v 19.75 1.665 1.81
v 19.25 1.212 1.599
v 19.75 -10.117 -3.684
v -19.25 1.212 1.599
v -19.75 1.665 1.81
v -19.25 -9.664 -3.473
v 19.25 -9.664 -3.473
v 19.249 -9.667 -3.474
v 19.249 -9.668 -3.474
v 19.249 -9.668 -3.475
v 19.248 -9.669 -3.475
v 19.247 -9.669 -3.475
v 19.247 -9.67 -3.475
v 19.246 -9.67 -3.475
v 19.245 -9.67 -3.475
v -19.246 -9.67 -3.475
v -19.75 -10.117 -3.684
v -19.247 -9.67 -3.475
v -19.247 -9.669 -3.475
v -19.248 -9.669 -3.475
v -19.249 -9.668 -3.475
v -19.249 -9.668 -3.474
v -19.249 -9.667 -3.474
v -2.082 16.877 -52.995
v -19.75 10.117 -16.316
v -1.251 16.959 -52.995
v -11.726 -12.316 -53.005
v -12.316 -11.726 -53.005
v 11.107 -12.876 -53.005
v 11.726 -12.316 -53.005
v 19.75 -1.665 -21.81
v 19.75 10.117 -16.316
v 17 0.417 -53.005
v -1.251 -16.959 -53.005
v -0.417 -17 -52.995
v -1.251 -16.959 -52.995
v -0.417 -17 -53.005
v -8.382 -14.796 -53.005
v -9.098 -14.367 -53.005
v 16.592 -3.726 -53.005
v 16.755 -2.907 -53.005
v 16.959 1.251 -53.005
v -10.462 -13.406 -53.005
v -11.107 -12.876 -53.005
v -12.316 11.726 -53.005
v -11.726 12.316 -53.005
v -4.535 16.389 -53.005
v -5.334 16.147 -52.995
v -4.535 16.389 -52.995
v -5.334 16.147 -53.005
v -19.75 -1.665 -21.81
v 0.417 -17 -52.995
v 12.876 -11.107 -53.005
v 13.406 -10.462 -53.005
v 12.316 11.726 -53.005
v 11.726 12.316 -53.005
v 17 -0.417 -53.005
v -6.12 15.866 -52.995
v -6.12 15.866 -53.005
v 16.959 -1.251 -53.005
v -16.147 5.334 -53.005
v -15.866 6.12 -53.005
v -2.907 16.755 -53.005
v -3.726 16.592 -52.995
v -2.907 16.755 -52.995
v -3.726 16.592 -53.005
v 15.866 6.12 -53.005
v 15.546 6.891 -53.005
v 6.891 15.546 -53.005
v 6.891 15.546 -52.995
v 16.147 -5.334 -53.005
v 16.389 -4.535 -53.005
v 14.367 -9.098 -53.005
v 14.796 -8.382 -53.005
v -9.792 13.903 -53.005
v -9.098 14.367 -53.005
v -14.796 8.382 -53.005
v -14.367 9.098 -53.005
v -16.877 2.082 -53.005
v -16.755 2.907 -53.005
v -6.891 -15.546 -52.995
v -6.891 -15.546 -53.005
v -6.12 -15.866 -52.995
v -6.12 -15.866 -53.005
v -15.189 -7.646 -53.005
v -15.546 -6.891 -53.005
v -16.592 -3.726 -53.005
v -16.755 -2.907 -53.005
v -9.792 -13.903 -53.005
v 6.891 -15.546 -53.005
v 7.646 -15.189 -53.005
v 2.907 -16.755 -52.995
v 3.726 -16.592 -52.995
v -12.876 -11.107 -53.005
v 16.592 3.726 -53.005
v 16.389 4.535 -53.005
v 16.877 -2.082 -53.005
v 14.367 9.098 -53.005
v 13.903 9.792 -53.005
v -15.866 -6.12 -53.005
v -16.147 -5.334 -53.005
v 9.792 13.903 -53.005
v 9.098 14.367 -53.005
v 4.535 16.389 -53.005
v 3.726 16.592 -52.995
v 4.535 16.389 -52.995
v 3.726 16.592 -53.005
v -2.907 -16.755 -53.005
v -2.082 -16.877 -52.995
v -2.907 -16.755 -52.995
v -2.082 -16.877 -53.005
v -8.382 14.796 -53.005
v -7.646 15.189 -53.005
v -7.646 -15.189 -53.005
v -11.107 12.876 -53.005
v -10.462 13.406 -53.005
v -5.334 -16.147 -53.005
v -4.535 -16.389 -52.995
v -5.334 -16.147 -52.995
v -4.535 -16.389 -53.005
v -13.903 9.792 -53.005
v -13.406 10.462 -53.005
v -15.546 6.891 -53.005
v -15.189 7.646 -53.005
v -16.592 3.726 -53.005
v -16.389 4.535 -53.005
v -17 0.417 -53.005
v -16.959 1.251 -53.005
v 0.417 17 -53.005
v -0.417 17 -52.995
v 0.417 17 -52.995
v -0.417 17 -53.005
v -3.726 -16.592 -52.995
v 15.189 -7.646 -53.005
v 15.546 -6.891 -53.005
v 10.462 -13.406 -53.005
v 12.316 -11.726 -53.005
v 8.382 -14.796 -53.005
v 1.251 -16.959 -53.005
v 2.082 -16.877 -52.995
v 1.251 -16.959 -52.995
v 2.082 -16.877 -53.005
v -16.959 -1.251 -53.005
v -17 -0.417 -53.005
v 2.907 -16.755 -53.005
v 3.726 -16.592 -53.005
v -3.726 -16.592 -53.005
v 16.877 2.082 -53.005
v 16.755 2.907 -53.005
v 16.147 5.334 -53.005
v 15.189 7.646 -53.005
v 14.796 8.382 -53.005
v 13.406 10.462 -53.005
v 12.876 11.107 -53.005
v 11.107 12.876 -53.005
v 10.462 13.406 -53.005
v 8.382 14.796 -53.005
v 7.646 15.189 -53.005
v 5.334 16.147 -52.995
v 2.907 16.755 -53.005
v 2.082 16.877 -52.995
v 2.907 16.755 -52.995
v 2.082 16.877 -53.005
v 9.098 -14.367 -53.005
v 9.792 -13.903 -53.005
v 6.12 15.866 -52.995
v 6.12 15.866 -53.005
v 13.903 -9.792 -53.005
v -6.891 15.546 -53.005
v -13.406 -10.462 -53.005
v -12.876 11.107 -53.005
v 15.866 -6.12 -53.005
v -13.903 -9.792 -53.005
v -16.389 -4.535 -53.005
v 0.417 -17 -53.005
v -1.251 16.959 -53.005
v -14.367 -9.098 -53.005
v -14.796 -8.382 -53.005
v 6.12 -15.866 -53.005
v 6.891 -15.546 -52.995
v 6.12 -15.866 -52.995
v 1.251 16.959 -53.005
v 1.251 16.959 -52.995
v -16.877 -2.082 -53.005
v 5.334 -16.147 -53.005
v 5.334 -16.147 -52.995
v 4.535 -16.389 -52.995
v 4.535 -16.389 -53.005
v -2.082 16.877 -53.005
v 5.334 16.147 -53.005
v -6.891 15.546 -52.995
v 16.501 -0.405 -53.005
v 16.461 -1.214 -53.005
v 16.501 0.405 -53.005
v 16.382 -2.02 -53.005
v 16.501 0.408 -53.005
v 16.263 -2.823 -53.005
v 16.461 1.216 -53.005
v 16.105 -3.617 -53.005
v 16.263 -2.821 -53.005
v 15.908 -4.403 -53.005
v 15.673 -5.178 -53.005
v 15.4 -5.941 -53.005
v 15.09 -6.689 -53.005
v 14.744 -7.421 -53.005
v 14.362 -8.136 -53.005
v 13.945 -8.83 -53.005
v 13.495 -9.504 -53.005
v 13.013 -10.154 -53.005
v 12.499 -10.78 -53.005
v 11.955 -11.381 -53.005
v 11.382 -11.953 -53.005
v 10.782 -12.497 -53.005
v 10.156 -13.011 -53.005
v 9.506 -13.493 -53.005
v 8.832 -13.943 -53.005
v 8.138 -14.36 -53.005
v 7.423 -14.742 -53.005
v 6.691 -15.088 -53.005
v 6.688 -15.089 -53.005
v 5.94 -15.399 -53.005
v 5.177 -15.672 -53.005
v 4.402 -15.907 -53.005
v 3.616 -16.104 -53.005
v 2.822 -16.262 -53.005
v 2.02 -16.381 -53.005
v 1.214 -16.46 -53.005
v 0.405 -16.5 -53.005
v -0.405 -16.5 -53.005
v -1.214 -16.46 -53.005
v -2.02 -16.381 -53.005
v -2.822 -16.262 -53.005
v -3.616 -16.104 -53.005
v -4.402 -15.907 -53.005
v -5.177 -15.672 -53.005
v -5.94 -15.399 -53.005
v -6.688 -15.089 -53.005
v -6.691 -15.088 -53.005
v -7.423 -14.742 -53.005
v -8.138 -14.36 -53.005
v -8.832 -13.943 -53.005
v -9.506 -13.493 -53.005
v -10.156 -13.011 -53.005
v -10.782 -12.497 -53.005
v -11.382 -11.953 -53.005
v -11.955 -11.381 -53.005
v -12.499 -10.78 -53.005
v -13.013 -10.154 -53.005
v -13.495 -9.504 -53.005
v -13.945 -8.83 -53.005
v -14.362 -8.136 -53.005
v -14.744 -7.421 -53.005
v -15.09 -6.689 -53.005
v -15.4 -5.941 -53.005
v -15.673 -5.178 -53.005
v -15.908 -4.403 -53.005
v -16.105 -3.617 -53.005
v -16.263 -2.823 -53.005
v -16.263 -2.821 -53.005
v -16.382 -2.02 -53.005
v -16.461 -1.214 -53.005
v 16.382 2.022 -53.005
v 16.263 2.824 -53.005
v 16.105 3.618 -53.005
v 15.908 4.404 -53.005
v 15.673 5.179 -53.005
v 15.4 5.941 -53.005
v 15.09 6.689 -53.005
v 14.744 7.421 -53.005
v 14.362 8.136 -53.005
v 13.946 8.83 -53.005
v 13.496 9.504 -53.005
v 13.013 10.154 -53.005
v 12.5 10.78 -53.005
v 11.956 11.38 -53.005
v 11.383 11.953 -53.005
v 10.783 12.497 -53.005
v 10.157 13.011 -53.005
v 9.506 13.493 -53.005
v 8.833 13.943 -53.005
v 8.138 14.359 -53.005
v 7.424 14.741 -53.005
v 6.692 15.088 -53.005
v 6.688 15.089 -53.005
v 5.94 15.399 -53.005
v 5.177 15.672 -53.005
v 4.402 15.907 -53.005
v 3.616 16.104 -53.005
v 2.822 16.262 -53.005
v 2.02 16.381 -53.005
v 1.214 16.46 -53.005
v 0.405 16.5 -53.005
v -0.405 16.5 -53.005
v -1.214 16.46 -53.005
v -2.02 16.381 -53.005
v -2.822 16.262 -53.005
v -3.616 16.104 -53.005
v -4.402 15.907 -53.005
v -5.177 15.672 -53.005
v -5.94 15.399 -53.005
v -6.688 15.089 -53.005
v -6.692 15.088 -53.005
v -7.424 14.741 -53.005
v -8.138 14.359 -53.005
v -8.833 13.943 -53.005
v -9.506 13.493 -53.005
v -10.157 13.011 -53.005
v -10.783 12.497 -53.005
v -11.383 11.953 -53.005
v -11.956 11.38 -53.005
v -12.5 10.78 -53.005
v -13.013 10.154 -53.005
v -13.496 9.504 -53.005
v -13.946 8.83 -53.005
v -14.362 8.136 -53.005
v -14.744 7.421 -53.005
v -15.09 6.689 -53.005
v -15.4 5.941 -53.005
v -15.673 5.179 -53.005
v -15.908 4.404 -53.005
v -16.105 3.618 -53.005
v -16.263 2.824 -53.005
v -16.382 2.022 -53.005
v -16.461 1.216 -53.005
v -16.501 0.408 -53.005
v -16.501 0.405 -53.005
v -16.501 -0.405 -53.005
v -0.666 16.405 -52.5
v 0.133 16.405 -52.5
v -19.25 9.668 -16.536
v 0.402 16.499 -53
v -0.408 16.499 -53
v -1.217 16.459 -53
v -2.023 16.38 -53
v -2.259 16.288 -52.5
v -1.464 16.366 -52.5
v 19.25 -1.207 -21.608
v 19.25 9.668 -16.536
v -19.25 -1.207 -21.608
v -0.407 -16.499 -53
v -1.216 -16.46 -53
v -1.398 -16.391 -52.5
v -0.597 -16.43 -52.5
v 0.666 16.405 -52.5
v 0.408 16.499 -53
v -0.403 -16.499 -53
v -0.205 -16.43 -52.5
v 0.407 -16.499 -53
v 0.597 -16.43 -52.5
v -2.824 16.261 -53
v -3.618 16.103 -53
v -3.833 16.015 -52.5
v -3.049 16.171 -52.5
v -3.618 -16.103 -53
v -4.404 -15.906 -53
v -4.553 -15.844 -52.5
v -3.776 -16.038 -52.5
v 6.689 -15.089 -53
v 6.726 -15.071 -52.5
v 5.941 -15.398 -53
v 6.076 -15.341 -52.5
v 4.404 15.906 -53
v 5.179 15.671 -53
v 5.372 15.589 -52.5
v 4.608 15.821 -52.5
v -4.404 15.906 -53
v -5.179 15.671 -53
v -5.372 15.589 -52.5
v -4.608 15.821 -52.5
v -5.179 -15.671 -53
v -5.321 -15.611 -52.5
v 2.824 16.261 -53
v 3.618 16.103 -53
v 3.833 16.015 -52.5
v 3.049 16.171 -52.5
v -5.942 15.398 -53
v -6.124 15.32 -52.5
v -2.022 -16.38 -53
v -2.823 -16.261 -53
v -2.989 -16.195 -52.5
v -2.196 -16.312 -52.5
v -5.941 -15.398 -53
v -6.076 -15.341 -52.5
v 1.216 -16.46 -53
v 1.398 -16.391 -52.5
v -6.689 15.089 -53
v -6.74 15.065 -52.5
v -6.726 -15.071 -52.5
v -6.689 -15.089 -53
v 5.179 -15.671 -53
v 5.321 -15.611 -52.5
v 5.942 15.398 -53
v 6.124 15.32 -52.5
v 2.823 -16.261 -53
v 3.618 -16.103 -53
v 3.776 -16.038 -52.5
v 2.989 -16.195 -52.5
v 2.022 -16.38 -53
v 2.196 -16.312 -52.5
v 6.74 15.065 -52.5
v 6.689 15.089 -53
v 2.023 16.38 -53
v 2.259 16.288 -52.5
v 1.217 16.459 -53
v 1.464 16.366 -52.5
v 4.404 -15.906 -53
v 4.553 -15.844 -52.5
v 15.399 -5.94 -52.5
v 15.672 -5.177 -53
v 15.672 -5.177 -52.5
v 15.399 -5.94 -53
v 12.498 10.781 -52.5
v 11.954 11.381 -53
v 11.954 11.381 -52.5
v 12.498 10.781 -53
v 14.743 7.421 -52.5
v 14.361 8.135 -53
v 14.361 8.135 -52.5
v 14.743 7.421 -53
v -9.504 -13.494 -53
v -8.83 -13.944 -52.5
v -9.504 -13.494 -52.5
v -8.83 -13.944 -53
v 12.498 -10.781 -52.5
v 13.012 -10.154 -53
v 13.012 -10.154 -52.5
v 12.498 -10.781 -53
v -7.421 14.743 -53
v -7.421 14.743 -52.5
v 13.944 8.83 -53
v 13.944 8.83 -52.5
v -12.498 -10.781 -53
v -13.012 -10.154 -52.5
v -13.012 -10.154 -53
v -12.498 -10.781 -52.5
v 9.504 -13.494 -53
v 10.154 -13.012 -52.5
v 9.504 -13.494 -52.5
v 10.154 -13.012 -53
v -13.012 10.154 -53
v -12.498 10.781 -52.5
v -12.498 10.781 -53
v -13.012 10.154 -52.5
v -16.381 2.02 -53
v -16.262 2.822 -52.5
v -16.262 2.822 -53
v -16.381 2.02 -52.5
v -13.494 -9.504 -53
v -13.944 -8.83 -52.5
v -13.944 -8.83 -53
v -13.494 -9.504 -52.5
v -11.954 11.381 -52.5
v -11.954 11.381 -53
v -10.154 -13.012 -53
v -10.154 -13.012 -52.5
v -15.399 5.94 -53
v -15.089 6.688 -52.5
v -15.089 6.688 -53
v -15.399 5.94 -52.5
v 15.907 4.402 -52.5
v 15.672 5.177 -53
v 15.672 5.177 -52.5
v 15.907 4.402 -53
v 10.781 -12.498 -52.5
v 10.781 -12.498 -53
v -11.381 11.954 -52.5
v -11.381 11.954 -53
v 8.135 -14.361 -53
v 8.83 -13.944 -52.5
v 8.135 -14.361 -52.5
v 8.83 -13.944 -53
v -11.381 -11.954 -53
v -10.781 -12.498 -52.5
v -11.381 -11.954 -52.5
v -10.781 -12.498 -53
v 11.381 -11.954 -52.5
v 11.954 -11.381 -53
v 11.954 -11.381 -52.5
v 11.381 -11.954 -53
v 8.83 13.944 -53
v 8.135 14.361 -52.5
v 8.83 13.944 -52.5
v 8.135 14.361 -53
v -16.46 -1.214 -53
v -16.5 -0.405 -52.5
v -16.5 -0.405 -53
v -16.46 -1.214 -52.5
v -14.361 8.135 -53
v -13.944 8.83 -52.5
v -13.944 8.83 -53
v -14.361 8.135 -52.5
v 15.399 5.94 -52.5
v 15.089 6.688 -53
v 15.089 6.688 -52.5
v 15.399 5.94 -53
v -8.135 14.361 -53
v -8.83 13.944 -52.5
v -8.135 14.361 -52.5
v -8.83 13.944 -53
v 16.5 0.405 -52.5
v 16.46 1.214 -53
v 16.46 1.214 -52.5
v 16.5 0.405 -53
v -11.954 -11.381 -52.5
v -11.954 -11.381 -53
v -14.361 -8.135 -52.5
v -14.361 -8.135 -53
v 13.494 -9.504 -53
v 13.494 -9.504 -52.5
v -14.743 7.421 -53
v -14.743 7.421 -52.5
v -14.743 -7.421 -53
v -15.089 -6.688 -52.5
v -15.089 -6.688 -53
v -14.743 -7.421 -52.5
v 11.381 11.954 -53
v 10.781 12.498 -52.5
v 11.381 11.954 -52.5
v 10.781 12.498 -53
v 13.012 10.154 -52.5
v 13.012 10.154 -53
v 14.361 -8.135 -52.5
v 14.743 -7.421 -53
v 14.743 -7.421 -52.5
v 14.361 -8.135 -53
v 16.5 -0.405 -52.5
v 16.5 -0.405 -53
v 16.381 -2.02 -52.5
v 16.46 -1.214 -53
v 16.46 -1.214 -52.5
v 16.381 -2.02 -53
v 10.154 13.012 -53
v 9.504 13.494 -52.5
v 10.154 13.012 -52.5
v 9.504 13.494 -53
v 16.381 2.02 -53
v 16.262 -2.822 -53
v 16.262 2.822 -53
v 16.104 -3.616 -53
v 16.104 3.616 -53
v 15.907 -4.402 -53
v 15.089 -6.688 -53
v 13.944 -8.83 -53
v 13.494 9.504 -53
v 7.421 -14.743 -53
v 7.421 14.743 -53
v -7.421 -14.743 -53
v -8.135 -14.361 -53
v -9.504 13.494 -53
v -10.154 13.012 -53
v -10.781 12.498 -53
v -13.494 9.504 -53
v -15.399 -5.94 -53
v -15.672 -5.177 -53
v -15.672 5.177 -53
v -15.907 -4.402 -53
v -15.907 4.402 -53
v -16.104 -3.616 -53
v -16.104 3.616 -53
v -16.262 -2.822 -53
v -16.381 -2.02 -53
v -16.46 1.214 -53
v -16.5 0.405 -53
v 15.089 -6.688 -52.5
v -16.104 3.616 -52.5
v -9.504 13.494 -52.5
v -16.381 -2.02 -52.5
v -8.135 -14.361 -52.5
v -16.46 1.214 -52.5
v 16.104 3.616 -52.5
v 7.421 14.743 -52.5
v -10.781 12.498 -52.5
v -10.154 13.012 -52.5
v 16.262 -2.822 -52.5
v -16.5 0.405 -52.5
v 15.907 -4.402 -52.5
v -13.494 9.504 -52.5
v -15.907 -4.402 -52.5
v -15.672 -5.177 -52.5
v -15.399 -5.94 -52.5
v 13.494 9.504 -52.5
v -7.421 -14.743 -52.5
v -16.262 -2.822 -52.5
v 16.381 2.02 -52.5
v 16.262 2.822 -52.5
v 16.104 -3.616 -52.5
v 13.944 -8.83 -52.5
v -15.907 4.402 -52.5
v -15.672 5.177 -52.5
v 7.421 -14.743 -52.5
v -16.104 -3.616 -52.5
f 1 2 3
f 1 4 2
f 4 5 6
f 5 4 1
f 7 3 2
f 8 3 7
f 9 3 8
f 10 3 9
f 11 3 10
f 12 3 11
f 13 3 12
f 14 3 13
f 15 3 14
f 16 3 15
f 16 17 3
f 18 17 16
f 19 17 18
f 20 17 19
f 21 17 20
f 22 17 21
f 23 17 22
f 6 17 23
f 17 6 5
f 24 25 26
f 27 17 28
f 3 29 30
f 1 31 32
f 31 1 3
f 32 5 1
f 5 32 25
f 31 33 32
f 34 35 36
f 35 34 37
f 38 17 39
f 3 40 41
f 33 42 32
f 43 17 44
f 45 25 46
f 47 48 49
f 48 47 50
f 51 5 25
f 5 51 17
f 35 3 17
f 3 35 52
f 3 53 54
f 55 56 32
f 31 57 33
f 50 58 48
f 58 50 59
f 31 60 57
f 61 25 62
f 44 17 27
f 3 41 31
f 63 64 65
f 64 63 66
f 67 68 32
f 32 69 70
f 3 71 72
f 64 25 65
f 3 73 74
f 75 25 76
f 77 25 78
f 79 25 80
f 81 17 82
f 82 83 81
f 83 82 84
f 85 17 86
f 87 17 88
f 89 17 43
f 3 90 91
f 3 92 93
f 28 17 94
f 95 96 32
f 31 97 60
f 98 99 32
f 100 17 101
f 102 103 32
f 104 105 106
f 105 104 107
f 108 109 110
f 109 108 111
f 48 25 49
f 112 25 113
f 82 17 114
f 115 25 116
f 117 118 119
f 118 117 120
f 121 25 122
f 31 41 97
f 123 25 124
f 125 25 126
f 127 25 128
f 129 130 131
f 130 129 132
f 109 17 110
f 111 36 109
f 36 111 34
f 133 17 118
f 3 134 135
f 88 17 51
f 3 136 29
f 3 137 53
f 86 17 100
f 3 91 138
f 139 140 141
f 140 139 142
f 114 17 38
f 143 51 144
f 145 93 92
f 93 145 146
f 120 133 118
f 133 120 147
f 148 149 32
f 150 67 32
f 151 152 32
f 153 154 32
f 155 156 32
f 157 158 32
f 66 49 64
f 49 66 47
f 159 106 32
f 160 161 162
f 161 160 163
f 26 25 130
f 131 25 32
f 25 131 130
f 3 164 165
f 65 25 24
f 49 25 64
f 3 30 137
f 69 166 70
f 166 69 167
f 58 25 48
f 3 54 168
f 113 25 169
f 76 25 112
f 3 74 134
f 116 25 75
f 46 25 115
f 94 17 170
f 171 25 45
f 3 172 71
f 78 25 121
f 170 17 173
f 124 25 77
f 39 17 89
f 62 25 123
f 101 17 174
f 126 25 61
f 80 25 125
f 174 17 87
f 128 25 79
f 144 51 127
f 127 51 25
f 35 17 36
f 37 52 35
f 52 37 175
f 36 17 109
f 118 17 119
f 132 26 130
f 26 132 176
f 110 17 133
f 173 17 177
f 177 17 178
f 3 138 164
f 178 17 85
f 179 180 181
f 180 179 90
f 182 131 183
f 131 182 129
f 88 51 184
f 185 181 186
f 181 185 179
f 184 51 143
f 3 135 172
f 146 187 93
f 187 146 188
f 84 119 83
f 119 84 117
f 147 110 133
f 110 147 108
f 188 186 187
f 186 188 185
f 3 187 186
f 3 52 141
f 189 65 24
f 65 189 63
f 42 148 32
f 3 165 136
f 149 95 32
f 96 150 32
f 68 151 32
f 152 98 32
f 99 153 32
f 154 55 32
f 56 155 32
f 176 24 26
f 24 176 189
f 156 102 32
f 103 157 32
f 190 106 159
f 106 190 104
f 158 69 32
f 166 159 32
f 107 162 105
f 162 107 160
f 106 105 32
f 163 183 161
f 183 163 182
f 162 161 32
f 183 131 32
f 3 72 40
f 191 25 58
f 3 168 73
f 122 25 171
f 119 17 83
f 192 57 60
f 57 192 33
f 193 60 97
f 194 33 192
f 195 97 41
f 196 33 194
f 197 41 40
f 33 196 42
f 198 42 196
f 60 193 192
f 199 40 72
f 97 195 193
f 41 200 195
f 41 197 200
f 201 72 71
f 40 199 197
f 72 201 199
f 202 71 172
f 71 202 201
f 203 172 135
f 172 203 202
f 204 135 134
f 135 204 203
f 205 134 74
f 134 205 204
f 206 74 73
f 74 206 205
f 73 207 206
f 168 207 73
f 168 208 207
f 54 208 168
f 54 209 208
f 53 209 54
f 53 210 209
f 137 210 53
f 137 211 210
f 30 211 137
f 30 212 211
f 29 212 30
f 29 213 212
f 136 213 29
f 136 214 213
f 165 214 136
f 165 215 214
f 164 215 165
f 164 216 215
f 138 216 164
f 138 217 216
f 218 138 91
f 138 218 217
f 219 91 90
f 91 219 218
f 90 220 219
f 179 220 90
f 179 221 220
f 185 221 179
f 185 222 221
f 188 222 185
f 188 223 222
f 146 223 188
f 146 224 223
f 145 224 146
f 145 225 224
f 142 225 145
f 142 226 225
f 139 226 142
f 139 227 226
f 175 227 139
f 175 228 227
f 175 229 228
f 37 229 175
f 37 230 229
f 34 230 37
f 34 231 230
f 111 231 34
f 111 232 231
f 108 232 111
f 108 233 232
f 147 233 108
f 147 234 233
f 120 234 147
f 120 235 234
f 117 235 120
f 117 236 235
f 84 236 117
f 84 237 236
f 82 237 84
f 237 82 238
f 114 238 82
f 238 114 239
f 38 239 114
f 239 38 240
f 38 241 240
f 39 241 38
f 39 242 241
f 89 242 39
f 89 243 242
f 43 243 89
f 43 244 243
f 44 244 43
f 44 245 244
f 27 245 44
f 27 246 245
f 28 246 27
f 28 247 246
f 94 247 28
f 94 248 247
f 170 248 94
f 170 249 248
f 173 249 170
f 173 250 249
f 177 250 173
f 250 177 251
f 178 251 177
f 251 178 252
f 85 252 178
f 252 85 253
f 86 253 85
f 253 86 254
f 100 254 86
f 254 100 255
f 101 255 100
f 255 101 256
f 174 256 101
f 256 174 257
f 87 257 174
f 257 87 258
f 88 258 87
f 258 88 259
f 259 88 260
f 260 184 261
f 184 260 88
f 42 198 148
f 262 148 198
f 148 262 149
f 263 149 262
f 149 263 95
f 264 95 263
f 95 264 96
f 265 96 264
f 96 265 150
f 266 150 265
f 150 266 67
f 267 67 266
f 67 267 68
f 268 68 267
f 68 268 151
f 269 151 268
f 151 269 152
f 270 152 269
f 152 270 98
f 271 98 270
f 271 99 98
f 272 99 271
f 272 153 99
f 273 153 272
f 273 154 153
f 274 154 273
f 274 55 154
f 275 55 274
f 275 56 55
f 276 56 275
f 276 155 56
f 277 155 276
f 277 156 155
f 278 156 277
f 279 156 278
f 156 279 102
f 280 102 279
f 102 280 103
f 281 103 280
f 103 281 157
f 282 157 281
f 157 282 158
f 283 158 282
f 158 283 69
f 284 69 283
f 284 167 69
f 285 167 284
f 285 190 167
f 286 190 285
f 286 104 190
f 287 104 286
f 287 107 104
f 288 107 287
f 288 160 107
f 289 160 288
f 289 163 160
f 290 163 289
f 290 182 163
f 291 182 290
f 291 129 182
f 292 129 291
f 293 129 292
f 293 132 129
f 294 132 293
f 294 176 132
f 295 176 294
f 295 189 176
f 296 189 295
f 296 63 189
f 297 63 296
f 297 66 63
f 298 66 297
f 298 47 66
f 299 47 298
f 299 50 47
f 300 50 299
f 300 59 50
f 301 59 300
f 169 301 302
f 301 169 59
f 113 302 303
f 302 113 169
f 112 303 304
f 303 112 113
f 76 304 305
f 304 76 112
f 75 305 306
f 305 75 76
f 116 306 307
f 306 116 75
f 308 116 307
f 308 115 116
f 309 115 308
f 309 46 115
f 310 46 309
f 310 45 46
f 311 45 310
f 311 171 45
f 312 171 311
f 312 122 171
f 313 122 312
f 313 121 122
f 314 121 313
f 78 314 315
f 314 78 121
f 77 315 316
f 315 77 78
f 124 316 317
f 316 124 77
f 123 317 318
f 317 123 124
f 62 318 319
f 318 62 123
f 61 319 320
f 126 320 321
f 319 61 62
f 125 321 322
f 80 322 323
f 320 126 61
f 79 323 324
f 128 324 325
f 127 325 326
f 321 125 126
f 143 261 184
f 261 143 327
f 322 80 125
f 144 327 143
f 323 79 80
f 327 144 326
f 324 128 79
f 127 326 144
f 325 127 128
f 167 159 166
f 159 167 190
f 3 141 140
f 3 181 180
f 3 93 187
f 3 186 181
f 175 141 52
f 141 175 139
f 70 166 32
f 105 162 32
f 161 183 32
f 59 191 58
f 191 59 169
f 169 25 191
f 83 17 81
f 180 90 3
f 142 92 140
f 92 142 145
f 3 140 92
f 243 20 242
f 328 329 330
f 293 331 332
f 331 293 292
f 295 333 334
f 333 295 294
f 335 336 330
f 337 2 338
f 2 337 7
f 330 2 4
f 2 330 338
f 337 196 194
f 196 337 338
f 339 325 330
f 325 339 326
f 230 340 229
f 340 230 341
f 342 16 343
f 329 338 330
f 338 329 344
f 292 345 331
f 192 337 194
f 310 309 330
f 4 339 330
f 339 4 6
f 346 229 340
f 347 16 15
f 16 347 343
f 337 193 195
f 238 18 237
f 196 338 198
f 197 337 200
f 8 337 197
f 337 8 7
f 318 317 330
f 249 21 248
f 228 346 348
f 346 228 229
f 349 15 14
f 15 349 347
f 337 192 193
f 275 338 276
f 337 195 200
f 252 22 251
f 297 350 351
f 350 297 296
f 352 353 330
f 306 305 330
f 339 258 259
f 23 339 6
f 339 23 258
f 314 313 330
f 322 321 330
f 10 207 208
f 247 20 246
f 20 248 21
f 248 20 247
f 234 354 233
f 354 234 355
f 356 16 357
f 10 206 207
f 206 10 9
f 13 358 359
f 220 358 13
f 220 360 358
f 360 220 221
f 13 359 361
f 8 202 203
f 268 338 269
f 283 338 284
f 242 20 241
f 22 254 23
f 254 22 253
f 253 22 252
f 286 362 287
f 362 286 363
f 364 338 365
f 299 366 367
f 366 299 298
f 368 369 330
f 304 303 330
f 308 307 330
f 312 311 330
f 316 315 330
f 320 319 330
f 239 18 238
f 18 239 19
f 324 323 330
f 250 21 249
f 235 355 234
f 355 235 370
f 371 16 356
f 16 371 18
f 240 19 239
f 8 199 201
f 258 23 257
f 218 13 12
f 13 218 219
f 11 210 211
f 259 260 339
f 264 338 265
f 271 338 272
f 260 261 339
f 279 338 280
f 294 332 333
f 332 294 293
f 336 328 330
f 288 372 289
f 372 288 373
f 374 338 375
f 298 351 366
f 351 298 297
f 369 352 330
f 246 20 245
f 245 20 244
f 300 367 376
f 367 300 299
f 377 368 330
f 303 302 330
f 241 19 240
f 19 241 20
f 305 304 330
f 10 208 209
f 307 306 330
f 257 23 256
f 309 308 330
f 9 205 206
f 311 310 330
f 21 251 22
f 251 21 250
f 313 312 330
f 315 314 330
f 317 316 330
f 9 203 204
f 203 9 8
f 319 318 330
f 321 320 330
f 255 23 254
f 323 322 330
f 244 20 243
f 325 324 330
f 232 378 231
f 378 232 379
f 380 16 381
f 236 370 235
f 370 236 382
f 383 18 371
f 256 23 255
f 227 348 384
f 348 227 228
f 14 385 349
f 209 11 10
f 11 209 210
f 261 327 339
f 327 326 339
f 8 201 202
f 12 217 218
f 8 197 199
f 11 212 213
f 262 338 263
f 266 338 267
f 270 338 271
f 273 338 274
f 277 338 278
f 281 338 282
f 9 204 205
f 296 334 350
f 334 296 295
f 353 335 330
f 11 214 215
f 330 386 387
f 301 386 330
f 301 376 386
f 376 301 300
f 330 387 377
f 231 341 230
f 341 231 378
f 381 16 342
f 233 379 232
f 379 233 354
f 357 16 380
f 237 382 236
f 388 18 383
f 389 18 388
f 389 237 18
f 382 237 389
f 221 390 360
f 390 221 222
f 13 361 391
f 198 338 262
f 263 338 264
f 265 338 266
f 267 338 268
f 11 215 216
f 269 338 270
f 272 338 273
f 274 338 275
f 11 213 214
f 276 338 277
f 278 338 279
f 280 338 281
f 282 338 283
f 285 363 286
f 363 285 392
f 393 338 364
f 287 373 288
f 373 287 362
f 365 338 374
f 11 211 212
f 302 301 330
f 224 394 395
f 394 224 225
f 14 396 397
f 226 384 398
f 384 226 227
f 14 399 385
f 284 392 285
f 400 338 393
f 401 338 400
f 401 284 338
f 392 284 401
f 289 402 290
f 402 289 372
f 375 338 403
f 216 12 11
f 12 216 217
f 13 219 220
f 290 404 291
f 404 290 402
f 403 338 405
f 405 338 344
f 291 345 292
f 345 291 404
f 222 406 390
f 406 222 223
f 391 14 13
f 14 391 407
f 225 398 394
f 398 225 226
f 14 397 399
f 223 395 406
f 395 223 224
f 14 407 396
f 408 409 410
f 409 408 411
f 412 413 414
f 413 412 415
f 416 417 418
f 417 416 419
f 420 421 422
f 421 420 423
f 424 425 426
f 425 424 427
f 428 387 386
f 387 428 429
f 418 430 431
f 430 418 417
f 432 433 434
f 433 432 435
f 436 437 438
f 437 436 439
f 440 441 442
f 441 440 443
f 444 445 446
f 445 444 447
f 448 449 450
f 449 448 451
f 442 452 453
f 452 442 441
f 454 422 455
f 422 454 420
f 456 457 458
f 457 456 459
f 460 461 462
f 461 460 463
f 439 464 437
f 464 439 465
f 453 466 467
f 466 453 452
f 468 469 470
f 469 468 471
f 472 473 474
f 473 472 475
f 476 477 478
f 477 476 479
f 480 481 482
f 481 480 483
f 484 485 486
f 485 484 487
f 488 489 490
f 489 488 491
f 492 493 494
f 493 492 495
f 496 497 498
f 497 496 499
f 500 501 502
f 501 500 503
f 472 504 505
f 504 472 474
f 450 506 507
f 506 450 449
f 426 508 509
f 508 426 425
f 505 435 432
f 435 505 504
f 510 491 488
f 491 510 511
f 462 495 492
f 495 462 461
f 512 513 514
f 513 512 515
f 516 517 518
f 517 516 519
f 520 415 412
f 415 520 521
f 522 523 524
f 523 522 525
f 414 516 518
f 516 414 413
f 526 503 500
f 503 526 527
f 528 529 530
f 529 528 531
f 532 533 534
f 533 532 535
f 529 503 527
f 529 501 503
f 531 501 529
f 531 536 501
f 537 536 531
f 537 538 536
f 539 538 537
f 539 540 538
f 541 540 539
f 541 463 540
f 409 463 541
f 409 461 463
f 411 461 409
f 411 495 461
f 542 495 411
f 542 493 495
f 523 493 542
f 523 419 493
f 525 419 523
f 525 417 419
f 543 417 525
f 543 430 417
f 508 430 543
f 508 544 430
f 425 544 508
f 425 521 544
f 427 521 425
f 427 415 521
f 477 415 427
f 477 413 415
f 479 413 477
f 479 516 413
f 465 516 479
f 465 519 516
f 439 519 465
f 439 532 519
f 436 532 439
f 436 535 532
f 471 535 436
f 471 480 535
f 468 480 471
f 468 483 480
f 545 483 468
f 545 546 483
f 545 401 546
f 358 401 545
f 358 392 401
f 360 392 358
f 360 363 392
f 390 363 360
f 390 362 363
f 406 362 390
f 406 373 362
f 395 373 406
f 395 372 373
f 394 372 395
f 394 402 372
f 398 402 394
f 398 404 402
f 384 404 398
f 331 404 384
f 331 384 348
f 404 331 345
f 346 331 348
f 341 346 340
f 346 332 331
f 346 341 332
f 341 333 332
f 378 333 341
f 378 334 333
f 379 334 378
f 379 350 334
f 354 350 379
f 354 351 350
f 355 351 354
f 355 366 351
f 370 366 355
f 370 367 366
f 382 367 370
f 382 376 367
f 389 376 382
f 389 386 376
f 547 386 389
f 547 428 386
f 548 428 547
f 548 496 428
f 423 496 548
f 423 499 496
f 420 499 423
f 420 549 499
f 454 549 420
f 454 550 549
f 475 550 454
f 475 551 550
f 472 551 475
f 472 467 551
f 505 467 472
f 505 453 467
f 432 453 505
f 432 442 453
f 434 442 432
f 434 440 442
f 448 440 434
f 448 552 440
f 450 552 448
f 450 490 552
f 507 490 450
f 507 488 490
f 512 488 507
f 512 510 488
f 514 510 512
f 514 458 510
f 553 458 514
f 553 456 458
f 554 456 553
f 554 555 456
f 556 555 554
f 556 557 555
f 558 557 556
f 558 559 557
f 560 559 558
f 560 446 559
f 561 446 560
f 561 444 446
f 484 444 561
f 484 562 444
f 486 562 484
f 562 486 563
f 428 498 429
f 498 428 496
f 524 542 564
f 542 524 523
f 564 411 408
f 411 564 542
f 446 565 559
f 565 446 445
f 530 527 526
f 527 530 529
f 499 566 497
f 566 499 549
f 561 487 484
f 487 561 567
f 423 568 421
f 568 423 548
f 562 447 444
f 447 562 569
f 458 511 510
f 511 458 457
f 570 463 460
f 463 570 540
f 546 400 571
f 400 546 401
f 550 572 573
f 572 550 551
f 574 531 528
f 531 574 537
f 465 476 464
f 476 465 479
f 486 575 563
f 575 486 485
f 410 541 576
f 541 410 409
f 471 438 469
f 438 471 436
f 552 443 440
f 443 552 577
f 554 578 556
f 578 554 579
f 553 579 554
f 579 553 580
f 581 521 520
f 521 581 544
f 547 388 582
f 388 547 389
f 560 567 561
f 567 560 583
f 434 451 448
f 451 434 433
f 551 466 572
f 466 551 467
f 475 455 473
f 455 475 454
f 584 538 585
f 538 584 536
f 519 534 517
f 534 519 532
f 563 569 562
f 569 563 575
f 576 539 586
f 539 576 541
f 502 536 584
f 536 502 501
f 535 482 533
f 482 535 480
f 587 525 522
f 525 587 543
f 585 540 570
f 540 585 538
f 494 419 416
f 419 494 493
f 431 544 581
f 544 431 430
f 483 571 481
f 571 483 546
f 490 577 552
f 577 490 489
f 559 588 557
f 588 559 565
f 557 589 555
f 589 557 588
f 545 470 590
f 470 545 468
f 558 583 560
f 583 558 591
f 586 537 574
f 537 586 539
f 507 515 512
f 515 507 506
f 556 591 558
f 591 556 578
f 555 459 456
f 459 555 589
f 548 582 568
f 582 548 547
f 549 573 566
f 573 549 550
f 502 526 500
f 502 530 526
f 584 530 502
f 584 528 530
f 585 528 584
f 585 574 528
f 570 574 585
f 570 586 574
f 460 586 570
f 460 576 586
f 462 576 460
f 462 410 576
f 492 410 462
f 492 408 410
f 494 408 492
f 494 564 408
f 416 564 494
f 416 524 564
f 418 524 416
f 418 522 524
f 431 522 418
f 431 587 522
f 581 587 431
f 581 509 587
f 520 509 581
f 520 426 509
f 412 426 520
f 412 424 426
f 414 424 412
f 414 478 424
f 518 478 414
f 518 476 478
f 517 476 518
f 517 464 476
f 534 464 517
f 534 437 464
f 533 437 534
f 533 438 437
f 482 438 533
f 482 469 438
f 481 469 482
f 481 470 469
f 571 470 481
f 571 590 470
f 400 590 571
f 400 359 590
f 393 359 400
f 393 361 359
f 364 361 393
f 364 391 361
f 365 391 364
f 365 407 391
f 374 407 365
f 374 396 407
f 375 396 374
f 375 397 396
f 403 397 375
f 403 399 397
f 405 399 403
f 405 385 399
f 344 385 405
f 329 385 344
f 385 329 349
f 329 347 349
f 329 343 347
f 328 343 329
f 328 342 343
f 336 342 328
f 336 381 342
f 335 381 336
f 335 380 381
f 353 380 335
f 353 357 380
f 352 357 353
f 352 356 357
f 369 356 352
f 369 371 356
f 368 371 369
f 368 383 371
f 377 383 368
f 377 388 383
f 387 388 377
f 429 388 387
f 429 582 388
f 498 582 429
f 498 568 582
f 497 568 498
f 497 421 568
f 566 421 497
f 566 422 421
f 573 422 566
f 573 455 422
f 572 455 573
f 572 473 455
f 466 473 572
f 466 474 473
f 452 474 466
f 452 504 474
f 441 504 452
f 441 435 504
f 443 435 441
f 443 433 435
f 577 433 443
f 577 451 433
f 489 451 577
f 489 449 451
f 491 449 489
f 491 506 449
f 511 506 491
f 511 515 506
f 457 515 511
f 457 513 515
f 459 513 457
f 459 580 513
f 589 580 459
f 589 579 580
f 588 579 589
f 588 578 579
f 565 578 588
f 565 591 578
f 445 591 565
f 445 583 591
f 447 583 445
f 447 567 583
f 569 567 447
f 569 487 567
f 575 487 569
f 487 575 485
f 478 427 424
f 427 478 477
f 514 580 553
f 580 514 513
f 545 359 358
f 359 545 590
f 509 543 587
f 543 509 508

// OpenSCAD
// Parametric Flash Diffusor
// V2 by Bikecyclist, 20 October 2019
// V2 by Bikecyclist, 04 October 2018
// V1 by Bikecyclist, 02 October 2018
// https://www.thingiverse.com/thing:3132304


// Vertical angle between the flash body and the lens axis
alpha = 25;

// Radius of the circular diffusor (outer radius if it's a polygon)
r = 33;

// Ellipse ratio (1 = circular)
er = 1.0;

// Width of flash body section
wflash = 39;

// Height of flash body section
hflash = 12.5;

// Reduction of body section dimensions to achieve clamping effect
dclamp = 0.5;

// Funnel length ... total length is radius + funnel length
l = 20;

// Wall thickness - keep it thin so it remains transparent
th = 0.5;

// Number of facets - try 4 for a square diffusor, 6 for a hexagon-shaped one, etc.
front_facets = 128;

// Number of facets
$fn = 128;

// Small distance to ensure proper meshing - normally no need to change it
epsilon = 0.01;

// Rotation angle of polygonal front face
anglefront = 90 - 180/front_facets + 180/front_facets * (front_facets % 2);


union ()
{
    difference ()
    {
        funnel (wflash - dclamp, hflash - dclamp, l, th);
        
        translate ([0, 0, epsilon])
            funnel (wflash - dclamp, hflash - dclamp, l + 2 * epsilon, 0);
    }
    
    translate ([0, 0, -l - r])
        resize ([er * r, r, th])
            rotate ([0, 0, anglefront])
                cylinder (r = r, h = th, $fn = front_facets);
}

module funnel (x, y, l, d)
{
    hull ()
    {
        translate ([0, 0, -l/2])
            rotate ([alpha, 0, 0])
                cube ([x + 2 * d, y + 2 * d, l], center = true);
        
        translate ([0, 0, - r - l])
            resize ([er * (r + 2 * d), r + 2 * d, 0.01])
                rotate ([0, 0, anglefront])
                    cylinder (r = r + d, h = 0.01, center = true, $fn = front_facets);
    }
}
